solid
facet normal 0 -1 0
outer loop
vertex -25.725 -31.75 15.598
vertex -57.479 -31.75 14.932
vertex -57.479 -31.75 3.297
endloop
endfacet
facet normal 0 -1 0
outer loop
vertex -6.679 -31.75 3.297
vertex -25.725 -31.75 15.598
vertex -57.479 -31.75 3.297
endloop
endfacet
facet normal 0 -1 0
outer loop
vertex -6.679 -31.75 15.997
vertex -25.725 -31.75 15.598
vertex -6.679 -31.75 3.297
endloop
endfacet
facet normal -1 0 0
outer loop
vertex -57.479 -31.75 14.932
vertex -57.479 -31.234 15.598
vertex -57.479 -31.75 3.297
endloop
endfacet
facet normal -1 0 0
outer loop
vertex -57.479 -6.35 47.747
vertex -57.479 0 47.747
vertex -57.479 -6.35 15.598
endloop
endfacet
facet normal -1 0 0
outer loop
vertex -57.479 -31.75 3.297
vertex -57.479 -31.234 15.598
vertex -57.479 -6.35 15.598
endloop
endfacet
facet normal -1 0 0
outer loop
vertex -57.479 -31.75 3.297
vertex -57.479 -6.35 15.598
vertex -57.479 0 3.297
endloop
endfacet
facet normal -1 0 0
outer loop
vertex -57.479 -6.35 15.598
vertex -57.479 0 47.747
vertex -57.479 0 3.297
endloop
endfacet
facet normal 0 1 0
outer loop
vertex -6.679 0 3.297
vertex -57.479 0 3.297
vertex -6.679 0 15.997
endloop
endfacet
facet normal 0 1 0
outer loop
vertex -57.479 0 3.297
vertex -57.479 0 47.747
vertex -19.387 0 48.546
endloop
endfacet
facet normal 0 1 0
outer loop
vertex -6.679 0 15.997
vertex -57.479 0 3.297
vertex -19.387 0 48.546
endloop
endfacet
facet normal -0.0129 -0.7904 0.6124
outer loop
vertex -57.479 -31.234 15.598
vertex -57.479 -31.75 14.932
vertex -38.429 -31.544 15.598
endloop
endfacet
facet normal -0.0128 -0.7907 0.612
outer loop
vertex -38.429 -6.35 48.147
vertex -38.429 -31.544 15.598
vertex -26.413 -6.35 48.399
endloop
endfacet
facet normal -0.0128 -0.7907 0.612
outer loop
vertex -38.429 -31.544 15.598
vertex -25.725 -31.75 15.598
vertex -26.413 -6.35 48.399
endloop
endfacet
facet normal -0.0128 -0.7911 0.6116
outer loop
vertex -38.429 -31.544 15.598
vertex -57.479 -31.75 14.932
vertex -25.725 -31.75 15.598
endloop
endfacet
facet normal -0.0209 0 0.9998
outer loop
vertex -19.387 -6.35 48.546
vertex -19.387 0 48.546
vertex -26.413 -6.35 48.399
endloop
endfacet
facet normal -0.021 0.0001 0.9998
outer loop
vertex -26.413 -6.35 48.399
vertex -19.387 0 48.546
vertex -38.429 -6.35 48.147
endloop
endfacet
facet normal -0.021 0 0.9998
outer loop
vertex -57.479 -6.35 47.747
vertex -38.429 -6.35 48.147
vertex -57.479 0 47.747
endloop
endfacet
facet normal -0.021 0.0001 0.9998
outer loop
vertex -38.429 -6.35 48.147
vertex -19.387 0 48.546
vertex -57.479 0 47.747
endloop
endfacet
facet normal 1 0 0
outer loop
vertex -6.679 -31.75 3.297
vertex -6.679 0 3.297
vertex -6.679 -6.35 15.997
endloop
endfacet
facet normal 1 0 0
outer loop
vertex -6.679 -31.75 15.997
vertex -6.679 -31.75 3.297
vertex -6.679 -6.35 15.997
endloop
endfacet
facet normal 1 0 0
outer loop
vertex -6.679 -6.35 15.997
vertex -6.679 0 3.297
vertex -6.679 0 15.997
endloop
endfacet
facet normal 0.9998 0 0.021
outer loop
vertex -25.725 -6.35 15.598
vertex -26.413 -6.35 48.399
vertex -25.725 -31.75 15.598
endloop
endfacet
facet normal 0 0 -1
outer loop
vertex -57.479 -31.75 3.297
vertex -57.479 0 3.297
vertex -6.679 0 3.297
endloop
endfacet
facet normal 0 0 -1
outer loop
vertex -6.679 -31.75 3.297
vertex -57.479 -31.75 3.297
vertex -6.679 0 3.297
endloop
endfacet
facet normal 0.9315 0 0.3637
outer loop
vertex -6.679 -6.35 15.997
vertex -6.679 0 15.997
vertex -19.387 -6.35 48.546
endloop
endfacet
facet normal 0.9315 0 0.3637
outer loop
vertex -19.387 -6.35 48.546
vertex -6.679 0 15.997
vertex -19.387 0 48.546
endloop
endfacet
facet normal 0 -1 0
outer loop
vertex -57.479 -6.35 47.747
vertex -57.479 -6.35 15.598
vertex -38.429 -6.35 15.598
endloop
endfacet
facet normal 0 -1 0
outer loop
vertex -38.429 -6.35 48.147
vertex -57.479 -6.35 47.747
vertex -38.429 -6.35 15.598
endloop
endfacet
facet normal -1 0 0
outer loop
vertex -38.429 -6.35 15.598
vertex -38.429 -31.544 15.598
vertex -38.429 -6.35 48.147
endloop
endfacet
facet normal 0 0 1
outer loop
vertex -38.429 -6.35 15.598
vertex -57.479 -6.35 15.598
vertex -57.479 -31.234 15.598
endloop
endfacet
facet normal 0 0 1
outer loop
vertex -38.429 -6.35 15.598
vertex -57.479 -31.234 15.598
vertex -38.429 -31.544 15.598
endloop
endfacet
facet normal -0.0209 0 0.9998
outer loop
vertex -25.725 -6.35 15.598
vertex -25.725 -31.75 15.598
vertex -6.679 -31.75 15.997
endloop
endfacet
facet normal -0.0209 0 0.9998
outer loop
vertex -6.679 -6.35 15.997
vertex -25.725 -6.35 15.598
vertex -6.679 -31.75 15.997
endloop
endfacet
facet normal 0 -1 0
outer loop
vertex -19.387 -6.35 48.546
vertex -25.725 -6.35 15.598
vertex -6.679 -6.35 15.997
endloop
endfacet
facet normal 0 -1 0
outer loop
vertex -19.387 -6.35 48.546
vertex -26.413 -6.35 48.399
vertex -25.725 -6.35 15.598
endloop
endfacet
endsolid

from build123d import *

# Parameters (mm, degrees)
F1_DEPTH = 31.75
F3_DEPTH = 25.4
F5_DEPTH = 32.0061992138


with BuildPart() as f1:
    # F0 (on Front) → F1 (new body)
    with BuildSketch(Plane.XZ):
        Polygon((-19.3872701909, 48.5464597168), (-57.4788887117, 47.7473361589), (-57.4788887117, 3.2973361589), (-6.6788887117, 3.2973361589), (-6.6788887117, 15.9973361589), align=None)
    extrude(amount=F1_DEPTH)

    # F2 (on face) → F3 (cut)
    with BuildSketch(Plane.XZ.offset(31.75)):
        Polygon((-38.4288887117, 15.59777438), (-38.4288887117, 48.1469858553), (-57.4788887117, 47.7473361589), (-57.4788887117, 15.59777438), align=None)
        Polygon((-25.7246979722, 15.59777438), (-6.6788887117, 15.9973361589), (-19.3872701909, 48.5464597168), (-26.4128359261, 48.3990704667), align=None)
    extrude(amount=-F3_DEPTH, mode=Mode.SUBTRACT)

    # F4 (on face) → F5 (cut, through all)
    with BuildSketch(Plane(origin=(-25.3862995067, 0, -0.5325788394), x_dir=(0, 1, 0), z_dir=(0.9997800137, 0, 0.0209743716))):
        Polygon((-31.75, 16.1339024573), (-6.35, 48.9424159686), (-31.75, 48.9424159686), align=None)
    extrude(amount=-F5_DEPTH, mode=Mode.SUBTRACT)


solid = f1.part
